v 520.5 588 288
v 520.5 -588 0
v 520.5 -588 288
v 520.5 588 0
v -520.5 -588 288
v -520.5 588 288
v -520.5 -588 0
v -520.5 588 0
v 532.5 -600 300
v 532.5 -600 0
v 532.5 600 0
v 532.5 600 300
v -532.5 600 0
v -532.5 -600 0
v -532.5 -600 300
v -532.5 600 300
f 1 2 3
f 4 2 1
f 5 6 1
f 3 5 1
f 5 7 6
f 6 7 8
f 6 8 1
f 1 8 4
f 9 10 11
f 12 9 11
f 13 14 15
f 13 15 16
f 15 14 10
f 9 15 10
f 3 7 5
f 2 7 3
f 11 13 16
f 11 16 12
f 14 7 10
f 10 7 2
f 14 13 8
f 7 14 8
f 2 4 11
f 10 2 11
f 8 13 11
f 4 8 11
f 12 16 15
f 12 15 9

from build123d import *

# Parameters (mm, degrees)
F0_W     = 1065
F0_H     = 1200
F0_W_2   = 1041
F0_H_2   = 1176
F1_DEPTH = 300
F2_W     = 1065
F2_H     = 1200
F3_DEPTH = 12


with BuildPart() as f1:
    # F0 (on Top) → F1 (new body)
    with BuildSketch(Plane.XY):
        Rectangle(F0_W, F0_H)
        Rectangle(F0_W_2, F0_H_2, mode=Mode.SUBTRACT)
    extrude(amount=F1_DEPTH)

    # F2 (on face) → F3 (join)
    with BuildSketch(Plane.XY.offset(300)):
        Rectangle(F2_W, F2_H)
    extrude(amount=-F3_DEPTH)


solid = f1.part
